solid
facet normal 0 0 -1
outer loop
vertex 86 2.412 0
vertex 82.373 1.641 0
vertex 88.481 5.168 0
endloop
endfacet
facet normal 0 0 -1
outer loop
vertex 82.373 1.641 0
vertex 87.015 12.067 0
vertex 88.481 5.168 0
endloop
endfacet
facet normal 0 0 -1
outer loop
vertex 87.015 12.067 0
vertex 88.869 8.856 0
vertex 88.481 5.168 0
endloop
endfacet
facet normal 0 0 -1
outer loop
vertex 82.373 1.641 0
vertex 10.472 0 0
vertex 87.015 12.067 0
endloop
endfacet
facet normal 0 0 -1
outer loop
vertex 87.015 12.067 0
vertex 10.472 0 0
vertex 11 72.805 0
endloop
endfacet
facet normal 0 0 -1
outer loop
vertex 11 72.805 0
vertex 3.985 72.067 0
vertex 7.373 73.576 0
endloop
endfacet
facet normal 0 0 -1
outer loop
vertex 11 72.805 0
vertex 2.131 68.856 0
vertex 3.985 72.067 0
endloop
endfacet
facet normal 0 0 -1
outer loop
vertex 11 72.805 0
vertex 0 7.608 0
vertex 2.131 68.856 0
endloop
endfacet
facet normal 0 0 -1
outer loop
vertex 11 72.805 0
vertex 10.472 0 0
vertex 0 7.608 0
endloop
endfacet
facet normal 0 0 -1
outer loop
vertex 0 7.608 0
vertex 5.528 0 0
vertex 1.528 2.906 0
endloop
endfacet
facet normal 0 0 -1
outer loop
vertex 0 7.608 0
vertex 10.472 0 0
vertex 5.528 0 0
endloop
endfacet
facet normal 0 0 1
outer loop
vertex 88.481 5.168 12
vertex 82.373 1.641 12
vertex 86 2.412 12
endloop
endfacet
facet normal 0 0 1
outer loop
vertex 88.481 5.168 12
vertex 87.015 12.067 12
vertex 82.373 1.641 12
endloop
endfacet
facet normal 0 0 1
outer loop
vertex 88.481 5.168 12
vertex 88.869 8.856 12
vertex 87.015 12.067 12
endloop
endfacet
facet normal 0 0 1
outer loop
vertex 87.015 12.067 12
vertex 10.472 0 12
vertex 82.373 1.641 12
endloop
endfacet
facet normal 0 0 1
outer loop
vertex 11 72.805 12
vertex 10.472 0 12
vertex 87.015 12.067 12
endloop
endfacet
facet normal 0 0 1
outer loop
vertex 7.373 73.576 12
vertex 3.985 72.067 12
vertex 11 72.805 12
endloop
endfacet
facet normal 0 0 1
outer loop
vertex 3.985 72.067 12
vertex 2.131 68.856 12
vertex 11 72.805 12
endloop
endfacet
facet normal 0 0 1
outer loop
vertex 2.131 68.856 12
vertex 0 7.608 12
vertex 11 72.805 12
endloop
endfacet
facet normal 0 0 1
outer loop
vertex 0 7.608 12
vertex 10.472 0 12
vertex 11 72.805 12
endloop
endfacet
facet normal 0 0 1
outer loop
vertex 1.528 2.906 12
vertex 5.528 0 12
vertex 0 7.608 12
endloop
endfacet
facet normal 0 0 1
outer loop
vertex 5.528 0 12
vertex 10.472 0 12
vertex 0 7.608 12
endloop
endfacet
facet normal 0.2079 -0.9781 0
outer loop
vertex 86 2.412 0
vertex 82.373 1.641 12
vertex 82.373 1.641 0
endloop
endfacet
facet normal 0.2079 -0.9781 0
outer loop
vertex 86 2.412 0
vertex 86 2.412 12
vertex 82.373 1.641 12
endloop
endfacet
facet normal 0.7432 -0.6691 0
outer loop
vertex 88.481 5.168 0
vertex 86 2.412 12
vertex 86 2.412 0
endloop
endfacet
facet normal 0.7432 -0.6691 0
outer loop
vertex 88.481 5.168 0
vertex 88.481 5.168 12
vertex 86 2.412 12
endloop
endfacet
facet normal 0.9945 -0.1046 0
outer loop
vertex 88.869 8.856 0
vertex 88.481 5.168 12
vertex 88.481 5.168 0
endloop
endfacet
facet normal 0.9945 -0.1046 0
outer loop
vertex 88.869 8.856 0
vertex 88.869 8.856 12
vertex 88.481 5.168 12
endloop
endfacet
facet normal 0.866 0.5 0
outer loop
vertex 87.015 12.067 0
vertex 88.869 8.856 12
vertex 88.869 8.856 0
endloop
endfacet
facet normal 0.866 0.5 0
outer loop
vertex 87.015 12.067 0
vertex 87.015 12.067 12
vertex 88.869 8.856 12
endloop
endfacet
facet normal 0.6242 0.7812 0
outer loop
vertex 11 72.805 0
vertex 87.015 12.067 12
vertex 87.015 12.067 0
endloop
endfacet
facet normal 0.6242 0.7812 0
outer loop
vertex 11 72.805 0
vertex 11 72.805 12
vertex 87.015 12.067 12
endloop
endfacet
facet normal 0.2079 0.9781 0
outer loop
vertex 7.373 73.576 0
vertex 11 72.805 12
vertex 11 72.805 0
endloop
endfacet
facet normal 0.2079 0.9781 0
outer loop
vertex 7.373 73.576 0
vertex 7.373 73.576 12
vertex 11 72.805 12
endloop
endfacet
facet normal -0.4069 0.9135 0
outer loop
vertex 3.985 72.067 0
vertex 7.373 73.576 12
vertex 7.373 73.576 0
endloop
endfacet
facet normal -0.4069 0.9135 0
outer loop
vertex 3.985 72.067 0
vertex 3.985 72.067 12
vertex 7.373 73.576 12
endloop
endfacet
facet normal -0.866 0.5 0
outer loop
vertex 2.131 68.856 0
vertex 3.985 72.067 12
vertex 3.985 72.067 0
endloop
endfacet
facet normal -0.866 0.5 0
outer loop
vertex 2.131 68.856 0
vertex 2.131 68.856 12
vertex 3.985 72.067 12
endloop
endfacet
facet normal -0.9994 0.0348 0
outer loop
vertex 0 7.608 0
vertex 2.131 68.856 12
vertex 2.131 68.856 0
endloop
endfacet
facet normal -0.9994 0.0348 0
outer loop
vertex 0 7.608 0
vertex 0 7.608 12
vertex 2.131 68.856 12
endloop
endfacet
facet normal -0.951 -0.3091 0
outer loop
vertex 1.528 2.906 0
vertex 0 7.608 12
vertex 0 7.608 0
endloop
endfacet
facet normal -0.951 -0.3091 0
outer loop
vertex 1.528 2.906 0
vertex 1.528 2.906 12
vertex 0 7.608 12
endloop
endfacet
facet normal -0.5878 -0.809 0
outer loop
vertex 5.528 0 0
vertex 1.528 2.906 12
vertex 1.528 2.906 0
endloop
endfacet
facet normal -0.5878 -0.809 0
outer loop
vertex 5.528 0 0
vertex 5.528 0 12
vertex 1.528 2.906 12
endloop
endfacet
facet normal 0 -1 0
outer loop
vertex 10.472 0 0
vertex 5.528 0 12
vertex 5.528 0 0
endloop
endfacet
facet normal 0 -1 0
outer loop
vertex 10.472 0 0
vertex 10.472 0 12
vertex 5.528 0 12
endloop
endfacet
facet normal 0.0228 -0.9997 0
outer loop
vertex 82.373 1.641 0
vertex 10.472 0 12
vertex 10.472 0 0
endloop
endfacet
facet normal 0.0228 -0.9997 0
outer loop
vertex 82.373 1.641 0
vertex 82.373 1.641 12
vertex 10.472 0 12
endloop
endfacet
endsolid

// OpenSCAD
$fn = 32;

// ----------------------------------------------------------------------
// Lever arm: two bosses 16 and 12 mm, 75 mm between centres
// ----------------------------------------------------------------------

// --- parameters (mm) ---
profile_height = 12;      // extrusion height
profile_points = 13;      // points of the closed outline

profile = [[0, 7.608], [1.528, 2.906], [5.528, 0], [10.472, 0], [82.373, 1.641], [86, 2.412], [88.481, 5.168], [88.869, 8.856], [87.015, 12.067], [11, 72.805], [7.373, 73.576], [3.985, 72.067], [2.131, 68.856]];  // single closed polygon, 13 points, counter clockwise

// --- the one profile operation ---
linear_extrude(height = profile_height) polygon(points = profile);
